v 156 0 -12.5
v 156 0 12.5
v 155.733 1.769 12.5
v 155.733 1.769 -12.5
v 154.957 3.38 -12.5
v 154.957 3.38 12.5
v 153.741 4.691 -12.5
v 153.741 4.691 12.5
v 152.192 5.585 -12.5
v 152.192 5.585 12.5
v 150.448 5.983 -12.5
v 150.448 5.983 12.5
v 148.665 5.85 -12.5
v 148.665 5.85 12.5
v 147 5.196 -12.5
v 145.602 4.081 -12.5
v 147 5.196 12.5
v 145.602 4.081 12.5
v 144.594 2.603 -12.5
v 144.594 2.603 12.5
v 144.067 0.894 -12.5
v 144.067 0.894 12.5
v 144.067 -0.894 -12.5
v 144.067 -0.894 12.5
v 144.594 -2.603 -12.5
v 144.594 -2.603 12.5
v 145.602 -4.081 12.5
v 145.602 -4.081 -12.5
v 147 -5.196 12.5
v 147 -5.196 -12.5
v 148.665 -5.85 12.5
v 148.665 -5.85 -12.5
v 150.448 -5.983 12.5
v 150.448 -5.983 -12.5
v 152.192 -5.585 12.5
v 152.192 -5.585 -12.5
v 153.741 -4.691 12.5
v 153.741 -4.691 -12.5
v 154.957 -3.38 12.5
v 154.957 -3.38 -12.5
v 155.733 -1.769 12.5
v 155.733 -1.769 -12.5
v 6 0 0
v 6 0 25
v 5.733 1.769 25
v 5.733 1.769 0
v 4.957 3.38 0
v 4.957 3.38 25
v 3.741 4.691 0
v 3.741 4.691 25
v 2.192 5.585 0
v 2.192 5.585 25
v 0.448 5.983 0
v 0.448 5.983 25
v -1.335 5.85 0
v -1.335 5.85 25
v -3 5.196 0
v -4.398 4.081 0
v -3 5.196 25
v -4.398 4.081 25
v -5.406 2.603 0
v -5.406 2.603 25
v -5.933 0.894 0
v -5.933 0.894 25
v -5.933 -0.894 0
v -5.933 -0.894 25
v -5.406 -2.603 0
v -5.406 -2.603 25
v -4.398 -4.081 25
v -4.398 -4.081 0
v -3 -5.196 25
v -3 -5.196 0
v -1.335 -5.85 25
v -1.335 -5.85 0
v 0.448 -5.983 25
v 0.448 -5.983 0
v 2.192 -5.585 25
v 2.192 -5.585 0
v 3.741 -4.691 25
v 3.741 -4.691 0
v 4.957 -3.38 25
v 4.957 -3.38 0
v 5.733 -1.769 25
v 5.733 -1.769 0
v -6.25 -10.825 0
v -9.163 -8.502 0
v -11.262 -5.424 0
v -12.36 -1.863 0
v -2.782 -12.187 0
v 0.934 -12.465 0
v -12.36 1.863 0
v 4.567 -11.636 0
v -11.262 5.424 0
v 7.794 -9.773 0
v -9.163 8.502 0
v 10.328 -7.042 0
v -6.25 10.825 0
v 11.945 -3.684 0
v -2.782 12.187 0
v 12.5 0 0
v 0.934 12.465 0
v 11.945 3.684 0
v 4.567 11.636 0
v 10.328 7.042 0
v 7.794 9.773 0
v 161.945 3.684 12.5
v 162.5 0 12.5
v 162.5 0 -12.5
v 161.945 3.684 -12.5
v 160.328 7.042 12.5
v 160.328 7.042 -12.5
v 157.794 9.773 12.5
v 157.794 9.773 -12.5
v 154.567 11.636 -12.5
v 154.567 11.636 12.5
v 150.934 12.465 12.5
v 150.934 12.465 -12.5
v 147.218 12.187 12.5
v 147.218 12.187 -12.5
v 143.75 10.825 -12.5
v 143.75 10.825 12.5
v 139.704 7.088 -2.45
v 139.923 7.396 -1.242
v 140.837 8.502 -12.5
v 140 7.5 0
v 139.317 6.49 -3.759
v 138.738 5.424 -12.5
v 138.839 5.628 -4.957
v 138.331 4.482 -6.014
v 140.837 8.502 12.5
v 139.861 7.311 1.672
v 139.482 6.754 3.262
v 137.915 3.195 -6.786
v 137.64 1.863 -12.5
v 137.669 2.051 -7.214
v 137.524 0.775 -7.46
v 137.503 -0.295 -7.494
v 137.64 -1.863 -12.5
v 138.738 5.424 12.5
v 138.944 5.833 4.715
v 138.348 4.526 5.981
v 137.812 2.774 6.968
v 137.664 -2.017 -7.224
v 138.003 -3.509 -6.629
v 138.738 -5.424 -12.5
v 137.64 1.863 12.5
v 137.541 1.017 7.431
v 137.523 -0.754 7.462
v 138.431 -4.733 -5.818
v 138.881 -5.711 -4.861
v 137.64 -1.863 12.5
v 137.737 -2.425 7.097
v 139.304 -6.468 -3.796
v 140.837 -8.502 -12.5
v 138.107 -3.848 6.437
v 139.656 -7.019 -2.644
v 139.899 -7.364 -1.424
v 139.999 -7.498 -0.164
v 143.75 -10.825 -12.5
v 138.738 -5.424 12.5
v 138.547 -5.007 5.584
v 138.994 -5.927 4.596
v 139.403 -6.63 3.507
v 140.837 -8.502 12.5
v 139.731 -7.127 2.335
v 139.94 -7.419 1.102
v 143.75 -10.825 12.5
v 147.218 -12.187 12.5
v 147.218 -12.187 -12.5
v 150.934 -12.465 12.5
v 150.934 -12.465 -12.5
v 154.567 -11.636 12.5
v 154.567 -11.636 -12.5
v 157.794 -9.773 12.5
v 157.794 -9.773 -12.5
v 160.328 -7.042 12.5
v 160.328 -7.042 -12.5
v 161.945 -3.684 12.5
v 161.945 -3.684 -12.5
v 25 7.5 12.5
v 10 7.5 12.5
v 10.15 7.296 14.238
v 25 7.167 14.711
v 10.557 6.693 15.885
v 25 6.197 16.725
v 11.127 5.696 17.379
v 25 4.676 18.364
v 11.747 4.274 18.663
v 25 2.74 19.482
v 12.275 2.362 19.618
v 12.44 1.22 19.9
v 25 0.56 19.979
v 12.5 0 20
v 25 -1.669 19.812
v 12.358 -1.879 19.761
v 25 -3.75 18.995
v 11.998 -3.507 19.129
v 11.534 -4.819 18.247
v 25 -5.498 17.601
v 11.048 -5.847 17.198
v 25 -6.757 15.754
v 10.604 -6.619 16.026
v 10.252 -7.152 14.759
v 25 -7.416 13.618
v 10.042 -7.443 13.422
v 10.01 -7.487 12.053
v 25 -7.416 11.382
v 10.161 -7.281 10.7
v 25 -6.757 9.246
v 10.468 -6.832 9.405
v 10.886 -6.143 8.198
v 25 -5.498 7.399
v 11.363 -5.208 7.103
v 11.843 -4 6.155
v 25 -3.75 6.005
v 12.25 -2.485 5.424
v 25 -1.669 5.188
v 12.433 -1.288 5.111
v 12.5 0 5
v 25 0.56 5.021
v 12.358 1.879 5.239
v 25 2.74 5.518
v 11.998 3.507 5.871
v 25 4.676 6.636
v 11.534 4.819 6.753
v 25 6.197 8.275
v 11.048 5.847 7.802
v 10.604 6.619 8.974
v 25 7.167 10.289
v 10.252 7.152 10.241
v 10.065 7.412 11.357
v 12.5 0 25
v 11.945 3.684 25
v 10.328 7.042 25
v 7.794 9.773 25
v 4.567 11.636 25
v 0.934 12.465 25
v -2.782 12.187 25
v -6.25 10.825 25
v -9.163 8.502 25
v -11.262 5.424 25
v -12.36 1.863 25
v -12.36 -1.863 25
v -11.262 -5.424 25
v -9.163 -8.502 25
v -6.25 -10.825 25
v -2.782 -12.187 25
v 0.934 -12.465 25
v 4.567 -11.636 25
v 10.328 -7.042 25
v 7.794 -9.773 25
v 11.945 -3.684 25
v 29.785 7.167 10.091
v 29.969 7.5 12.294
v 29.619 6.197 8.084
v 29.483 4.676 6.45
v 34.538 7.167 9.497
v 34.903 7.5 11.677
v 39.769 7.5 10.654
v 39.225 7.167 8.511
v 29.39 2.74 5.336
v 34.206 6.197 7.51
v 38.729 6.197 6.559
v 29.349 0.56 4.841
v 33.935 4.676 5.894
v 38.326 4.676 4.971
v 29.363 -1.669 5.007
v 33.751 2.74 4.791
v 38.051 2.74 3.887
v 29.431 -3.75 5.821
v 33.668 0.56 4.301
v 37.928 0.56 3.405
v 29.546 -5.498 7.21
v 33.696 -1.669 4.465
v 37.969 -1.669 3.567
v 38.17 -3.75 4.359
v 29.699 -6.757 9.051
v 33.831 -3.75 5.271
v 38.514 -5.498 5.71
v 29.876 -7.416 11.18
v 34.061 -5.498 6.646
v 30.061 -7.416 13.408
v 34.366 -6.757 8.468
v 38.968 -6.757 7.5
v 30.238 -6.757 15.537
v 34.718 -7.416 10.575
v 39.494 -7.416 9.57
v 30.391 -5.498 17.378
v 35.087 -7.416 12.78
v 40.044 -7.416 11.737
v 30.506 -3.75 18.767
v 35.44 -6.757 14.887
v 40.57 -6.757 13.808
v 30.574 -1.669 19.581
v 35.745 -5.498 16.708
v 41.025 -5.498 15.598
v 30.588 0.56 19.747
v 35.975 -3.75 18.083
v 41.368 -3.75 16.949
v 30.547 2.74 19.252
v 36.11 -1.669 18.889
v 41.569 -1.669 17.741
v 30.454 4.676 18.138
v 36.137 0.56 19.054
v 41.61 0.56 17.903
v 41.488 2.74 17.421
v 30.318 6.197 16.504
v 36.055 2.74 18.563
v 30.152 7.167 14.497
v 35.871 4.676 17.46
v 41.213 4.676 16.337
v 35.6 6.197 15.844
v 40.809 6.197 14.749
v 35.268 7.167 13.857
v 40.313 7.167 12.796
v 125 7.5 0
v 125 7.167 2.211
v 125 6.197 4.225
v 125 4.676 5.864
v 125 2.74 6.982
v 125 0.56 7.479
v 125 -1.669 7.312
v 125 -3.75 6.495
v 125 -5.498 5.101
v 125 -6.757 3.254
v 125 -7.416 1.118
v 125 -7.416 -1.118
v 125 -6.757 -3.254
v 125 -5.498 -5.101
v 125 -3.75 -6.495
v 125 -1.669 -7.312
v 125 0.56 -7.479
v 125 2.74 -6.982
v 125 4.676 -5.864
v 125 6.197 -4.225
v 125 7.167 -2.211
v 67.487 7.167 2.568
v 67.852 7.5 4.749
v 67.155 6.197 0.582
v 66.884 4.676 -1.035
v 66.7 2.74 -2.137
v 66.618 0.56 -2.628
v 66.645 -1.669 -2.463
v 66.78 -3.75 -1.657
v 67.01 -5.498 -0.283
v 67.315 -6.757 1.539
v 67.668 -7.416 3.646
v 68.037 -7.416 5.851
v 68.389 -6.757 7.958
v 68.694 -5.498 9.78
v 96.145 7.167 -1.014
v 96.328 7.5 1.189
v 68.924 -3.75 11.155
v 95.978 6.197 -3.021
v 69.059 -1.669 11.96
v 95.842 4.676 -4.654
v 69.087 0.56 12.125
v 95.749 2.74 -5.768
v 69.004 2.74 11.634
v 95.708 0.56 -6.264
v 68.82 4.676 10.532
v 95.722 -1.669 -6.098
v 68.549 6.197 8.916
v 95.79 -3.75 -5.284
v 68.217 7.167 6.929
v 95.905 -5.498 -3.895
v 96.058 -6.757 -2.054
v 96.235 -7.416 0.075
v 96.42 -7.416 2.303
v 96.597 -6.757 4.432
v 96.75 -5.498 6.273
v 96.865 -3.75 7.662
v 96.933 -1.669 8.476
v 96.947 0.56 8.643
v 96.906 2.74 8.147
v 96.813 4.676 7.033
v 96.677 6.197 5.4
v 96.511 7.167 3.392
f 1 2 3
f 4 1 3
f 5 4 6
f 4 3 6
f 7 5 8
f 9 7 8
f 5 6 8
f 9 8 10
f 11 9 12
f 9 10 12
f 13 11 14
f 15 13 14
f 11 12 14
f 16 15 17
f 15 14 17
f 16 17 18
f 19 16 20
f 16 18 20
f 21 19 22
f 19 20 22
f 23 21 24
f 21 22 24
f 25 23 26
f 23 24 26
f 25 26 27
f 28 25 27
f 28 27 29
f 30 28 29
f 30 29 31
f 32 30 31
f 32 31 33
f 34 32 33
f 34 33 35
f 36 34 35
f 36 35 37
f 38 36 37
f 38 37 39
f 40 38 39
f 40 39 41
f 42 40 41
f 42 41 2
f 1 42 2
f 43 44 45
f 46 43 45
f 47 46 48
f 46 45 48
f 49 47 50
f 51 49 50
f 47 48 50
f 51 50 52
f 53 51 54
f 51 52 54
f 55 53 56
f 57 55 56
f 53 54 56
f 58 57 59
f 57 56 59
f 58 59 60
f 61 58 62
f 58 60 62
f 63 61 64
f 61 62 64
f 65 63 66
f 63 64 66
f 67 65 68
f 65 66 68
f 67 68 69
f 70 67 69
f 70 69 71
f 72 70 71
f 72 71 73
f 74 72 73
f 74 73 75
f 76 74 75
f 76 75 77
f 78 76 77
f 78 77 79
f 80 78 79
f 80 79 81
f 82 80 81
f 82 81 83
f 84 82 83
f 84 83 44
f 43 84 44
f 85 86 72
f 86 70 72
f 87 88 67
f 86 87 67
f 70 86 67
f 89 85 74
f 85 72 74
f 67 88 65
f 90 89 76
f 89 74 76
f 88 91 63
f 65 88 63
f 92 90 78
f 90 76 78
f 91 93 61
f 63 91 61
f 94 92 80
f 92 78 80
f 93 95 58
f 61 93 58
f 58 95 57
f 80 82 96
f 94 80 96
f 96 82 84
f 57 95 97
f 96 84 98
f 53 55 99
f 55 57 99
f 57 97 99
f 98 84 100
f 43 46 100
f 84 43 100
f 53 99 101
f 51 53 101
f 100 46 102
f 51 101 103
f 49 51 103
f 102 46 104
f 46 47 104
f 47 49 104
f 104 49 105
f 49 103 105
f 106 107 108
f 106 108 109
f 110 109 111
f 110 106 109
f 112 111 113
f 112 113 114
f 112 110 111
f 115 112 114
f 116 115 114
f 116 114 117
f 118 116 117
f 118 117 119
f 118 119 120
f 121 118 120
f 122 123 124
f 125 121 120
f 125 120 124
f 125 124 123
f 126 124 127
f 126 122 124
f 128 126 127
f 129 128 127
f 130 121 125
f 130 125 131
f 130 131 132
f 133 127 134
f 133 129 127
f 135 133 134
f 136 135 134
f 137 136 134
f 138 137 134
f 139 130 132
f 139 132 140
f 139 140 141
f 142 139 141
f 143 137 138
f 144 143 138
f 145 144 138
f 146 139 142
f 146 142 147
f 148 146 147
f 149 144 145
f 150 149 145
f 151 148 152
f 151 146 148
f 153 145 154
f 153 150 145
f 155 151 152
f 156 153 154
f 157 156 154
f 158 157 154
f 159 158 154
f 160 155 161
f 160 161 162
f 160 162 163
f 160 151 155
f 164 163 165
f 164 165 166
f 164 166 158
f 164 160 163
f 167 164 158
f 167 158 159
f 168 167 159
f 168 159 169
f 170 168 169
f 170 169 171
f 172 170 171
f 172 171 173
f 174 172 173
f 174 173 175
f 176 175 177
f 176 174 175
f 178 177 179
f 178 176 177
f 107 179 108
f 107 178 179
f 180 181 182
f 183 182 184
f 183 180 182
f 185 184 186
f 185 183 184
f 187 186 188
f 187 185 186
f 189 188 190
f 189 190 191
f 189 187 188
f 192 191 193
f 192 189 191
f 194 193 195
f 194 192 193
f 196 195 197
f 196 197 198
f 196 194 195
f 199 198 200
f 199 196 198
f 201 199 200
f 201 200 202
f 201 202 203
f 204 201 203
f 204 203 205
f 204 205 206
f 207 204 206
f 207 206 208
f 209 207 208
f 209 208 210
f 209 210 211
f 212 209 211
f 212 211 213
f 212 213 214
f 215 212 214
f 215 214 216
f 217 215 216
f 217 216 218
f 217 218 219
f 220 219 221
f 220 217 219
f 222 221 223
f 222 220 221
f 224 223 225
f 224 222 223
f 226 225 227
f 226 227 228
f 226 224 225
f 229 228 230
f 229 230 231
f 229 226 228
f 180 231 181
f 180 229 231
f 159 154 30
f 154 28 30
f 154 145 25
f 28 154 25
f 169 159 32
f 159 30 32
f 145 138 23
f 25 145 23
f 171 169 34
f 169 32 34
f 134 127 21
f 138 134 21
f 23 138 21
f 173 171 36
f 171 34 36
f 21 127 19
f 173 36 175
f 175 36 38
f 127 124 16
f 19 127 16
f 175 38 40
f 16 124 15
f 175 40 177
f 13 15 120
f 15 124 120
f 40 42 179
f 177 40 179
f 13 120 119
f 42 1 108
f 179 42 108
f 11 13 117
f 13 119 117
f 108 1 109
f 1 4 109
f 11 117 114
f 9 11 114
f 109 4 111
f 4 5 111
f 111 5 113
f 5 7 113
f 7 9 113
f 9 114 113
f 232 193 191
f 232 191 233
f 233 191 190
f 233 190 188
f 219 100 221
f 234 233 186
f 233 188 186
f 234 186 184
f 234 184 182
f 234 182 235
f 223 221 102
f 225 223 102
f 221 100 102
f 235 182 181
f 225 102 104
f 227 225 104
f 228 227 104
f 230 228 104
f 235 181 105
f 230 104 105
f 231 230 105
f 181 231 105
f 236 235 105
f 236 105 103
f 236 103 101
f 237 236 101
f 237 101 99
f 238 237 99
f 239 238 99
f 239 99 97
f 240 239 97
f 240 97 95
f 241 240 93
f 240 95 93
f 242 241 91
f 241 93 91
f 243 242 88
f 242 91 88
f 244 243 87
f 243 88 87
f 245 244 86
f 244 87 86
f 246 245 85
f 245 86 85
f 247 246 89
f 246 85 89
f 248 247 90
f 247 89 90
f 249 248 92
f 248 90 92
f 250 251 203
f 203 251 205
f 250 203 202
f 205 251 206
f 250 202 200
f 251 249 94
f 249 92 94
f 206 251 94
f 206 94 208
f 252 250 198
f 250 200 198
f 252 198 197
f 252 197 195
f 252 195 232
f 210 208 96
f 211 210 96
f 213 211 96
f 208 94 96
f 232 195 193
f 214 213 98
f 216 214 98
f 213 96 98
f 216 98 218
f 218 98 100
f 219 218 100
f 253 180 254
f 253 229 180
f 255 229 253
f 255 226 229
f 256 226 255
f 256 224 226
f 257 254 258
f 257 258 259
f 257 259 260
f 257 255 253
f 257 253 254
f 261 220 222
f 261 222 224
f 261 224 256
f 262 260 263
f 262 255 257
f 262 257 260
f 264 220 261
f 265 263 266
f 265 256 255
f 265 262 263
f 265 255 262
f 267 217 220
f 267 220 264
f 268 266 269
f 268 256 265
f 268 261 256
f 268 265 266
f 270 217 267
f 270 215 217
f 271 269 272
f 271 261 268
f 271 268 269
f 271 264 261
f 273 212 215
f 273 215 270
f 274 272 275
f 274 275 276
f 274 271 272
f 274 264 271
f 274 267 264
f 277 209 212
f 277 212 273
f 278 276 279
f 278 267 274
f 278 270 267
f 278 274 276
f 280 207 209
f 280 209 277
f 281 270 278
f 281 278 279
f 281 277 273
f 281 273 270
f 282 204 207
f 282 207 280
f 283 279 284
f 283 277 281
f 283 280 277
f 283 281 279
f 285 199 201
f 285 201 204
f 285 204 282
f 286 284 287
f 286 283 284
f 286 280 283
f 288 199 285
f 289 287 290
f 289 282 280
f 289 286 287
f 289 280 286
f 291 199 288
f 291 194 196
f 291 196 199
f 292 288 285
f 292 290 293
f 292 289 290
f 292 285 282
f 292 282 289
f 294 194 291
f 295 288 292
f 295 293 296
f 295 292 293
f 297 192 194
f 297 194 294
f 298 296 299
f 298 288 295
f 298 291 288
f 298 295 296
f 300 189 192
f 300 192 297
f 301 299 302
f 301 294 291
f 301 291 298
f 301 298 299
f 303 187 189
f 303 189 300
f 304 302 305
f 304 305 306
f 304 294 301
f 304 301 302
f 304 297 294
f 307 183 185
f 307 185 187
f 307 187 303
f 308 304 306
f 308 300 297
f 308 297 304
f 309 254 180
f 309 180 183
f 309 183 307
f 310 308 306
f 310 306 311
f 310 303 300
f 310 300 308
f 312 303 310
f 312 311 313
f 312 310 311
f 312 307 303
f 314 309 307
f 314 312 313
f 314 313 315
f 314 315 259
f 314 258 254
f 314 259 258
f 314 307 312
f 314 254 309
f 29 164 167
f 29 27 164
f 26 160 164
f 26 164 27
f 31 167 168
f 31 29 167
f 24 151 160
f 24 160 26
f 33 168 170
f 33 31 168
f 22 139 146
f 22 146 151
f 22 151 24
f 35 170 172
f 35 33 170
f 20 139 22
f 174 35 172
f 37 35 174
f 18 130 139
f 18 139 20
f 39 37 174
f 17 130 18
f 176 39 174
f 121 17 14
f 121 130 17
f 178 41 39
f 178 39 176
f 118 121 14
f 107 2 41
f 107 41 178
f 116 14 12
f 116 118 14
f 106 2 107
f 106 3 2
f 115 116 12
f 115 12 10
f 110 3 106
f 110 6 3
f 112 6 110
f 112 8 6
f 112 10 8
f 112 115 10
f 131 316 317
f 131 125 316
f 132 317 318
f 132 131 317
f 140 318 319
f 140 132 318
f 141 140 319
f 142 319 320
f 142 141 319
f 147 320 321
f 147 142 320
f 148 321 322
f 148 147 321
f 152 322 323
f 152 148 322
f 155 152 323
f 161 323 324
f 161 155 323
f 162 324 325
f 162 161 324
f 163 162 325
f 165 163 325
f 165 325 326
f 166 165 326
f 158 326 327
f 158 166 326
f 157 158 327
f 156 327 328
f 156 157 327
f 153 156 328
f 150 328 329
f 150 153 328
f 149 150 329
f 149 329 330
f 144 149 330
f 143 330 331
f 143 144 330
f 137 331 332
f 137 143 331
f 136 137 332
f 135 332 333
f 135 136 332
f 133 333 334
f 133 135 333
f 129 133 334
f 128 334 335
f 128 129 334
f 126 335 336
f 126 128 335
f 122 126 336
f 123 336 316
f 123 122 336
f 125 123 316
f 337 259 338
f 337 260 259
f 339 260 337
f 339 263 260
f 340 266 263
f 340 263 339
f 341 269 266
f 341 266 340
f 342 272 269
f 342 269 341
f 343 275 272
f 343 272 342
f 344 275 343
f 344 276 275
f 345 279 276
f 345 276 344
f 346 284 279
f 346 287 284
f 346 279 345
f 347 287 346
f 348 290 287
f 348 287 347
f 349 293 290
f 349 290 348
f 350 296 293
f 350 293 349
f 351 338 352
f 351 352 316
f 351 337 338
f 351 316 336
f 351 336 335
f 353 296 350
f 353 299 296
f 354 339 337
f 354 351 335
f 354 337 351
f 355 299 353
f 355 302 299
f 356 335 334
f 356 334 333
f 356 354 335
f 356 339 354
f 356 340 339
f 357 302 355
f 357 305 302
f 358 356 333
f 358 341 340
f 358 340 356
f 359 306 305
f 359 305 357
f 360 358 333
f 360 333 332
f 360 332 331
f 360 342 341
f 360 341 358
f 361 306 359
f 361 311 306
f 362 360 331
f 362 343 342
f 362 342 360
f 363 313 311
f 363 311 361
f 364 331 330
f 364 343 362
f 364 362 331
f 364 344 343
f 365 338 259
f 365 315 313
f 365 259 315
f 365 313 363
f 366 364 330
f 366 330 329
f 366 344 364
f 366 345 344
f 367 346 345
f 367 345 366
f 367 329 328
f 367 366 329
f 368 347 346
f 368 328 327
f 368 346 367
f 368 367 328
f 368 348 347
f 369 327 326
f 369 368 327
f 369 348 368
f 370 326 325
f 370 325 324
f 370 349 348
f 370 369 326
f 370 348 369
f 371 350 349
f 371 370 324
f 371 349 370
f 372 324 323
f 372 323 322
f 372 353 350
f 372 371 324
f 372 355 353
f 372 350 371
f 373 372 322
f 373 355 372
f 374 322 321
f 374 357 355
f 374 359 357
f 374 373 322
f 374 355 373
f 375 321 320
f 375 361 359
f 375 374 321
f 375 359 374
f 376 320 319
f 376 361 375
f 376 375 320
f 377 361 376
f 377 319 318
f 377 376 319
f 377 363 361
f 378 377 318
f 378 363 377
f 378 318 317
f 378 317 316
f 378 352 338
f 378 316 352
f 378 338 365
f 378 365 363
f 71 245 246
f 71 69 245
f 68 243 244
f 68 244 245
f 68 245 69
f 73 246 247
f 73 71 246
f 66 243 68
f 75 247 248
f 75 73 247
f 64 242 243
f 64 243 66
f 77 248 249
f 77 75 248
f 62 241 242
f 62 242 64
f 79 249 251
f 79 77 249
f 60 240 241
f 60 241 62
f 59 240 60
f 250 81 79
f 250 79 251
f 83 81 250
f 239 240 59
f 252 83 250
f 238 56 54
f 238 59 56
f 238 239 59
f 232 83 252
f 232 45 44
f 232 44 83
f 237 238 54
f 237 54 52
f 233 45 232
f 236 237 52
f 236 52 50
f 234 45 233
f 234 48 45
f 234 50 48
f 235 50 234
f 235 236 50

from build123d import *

# Parameters (mm, degrees)
F0_R     = 12.5
F1_DEPTH = 25
F2_DEPTH = 12.5
F4_R     = 7.5
F6_R     = 6
F7_DEPTH = 37.5010001


with BuildPart() as f1:
    # F0 (on Top) → F1 (new body)
    with BuildSketch(Plane.XY):
        Circle(F0_R)
    extrude(amount=F1_DEPTH)



with BuildPart() as f2:
    # F0 (on Top) → F2 (new body, symmetric)
    with BuildSketch(Plane.XY):
        with Locations((150, 0)):
            Circle(F0_R)
    extrude(amount=F2_DEPTH, both=True)


with BuildPart() as f1_1:
    add(f1.part)

    add(f2.part)  # F5 merges F2
    # F5: sweep along a path in F3
    with BuildLine(Plane.XZ) as f5_path:
        Line((0, 12.5), (25, 12.5))
        ThreePointArc((25, 12.5), (32.4420840754, 12.0366726028), (39.7692307692, 10.6538461538))
        ThreePointArc((39.7692307692, 10.6538461538), (82.0529731485, 2.6737851879), (125, 0))
        Line((125, 0), (150, 0))
    # F4 (on Right) → F5 (sweep)
    with BuildSketch(Plane.YZ):
        with Locations((0, 12.5)):
            Circle(F4_R)
    sweep(path=f5_path.line)

    # F6 (on face) → F7 (cut, through all)
    with BuildSketch(Plane.XY.offset(25)):
        Circle(F6_R)
        with Locations((150, 0)):
            Circle(F6_R)
    extrude(amount=-F7_DEPTH, mode=Mode.SUBTRACT)


solid = f1_1.part
